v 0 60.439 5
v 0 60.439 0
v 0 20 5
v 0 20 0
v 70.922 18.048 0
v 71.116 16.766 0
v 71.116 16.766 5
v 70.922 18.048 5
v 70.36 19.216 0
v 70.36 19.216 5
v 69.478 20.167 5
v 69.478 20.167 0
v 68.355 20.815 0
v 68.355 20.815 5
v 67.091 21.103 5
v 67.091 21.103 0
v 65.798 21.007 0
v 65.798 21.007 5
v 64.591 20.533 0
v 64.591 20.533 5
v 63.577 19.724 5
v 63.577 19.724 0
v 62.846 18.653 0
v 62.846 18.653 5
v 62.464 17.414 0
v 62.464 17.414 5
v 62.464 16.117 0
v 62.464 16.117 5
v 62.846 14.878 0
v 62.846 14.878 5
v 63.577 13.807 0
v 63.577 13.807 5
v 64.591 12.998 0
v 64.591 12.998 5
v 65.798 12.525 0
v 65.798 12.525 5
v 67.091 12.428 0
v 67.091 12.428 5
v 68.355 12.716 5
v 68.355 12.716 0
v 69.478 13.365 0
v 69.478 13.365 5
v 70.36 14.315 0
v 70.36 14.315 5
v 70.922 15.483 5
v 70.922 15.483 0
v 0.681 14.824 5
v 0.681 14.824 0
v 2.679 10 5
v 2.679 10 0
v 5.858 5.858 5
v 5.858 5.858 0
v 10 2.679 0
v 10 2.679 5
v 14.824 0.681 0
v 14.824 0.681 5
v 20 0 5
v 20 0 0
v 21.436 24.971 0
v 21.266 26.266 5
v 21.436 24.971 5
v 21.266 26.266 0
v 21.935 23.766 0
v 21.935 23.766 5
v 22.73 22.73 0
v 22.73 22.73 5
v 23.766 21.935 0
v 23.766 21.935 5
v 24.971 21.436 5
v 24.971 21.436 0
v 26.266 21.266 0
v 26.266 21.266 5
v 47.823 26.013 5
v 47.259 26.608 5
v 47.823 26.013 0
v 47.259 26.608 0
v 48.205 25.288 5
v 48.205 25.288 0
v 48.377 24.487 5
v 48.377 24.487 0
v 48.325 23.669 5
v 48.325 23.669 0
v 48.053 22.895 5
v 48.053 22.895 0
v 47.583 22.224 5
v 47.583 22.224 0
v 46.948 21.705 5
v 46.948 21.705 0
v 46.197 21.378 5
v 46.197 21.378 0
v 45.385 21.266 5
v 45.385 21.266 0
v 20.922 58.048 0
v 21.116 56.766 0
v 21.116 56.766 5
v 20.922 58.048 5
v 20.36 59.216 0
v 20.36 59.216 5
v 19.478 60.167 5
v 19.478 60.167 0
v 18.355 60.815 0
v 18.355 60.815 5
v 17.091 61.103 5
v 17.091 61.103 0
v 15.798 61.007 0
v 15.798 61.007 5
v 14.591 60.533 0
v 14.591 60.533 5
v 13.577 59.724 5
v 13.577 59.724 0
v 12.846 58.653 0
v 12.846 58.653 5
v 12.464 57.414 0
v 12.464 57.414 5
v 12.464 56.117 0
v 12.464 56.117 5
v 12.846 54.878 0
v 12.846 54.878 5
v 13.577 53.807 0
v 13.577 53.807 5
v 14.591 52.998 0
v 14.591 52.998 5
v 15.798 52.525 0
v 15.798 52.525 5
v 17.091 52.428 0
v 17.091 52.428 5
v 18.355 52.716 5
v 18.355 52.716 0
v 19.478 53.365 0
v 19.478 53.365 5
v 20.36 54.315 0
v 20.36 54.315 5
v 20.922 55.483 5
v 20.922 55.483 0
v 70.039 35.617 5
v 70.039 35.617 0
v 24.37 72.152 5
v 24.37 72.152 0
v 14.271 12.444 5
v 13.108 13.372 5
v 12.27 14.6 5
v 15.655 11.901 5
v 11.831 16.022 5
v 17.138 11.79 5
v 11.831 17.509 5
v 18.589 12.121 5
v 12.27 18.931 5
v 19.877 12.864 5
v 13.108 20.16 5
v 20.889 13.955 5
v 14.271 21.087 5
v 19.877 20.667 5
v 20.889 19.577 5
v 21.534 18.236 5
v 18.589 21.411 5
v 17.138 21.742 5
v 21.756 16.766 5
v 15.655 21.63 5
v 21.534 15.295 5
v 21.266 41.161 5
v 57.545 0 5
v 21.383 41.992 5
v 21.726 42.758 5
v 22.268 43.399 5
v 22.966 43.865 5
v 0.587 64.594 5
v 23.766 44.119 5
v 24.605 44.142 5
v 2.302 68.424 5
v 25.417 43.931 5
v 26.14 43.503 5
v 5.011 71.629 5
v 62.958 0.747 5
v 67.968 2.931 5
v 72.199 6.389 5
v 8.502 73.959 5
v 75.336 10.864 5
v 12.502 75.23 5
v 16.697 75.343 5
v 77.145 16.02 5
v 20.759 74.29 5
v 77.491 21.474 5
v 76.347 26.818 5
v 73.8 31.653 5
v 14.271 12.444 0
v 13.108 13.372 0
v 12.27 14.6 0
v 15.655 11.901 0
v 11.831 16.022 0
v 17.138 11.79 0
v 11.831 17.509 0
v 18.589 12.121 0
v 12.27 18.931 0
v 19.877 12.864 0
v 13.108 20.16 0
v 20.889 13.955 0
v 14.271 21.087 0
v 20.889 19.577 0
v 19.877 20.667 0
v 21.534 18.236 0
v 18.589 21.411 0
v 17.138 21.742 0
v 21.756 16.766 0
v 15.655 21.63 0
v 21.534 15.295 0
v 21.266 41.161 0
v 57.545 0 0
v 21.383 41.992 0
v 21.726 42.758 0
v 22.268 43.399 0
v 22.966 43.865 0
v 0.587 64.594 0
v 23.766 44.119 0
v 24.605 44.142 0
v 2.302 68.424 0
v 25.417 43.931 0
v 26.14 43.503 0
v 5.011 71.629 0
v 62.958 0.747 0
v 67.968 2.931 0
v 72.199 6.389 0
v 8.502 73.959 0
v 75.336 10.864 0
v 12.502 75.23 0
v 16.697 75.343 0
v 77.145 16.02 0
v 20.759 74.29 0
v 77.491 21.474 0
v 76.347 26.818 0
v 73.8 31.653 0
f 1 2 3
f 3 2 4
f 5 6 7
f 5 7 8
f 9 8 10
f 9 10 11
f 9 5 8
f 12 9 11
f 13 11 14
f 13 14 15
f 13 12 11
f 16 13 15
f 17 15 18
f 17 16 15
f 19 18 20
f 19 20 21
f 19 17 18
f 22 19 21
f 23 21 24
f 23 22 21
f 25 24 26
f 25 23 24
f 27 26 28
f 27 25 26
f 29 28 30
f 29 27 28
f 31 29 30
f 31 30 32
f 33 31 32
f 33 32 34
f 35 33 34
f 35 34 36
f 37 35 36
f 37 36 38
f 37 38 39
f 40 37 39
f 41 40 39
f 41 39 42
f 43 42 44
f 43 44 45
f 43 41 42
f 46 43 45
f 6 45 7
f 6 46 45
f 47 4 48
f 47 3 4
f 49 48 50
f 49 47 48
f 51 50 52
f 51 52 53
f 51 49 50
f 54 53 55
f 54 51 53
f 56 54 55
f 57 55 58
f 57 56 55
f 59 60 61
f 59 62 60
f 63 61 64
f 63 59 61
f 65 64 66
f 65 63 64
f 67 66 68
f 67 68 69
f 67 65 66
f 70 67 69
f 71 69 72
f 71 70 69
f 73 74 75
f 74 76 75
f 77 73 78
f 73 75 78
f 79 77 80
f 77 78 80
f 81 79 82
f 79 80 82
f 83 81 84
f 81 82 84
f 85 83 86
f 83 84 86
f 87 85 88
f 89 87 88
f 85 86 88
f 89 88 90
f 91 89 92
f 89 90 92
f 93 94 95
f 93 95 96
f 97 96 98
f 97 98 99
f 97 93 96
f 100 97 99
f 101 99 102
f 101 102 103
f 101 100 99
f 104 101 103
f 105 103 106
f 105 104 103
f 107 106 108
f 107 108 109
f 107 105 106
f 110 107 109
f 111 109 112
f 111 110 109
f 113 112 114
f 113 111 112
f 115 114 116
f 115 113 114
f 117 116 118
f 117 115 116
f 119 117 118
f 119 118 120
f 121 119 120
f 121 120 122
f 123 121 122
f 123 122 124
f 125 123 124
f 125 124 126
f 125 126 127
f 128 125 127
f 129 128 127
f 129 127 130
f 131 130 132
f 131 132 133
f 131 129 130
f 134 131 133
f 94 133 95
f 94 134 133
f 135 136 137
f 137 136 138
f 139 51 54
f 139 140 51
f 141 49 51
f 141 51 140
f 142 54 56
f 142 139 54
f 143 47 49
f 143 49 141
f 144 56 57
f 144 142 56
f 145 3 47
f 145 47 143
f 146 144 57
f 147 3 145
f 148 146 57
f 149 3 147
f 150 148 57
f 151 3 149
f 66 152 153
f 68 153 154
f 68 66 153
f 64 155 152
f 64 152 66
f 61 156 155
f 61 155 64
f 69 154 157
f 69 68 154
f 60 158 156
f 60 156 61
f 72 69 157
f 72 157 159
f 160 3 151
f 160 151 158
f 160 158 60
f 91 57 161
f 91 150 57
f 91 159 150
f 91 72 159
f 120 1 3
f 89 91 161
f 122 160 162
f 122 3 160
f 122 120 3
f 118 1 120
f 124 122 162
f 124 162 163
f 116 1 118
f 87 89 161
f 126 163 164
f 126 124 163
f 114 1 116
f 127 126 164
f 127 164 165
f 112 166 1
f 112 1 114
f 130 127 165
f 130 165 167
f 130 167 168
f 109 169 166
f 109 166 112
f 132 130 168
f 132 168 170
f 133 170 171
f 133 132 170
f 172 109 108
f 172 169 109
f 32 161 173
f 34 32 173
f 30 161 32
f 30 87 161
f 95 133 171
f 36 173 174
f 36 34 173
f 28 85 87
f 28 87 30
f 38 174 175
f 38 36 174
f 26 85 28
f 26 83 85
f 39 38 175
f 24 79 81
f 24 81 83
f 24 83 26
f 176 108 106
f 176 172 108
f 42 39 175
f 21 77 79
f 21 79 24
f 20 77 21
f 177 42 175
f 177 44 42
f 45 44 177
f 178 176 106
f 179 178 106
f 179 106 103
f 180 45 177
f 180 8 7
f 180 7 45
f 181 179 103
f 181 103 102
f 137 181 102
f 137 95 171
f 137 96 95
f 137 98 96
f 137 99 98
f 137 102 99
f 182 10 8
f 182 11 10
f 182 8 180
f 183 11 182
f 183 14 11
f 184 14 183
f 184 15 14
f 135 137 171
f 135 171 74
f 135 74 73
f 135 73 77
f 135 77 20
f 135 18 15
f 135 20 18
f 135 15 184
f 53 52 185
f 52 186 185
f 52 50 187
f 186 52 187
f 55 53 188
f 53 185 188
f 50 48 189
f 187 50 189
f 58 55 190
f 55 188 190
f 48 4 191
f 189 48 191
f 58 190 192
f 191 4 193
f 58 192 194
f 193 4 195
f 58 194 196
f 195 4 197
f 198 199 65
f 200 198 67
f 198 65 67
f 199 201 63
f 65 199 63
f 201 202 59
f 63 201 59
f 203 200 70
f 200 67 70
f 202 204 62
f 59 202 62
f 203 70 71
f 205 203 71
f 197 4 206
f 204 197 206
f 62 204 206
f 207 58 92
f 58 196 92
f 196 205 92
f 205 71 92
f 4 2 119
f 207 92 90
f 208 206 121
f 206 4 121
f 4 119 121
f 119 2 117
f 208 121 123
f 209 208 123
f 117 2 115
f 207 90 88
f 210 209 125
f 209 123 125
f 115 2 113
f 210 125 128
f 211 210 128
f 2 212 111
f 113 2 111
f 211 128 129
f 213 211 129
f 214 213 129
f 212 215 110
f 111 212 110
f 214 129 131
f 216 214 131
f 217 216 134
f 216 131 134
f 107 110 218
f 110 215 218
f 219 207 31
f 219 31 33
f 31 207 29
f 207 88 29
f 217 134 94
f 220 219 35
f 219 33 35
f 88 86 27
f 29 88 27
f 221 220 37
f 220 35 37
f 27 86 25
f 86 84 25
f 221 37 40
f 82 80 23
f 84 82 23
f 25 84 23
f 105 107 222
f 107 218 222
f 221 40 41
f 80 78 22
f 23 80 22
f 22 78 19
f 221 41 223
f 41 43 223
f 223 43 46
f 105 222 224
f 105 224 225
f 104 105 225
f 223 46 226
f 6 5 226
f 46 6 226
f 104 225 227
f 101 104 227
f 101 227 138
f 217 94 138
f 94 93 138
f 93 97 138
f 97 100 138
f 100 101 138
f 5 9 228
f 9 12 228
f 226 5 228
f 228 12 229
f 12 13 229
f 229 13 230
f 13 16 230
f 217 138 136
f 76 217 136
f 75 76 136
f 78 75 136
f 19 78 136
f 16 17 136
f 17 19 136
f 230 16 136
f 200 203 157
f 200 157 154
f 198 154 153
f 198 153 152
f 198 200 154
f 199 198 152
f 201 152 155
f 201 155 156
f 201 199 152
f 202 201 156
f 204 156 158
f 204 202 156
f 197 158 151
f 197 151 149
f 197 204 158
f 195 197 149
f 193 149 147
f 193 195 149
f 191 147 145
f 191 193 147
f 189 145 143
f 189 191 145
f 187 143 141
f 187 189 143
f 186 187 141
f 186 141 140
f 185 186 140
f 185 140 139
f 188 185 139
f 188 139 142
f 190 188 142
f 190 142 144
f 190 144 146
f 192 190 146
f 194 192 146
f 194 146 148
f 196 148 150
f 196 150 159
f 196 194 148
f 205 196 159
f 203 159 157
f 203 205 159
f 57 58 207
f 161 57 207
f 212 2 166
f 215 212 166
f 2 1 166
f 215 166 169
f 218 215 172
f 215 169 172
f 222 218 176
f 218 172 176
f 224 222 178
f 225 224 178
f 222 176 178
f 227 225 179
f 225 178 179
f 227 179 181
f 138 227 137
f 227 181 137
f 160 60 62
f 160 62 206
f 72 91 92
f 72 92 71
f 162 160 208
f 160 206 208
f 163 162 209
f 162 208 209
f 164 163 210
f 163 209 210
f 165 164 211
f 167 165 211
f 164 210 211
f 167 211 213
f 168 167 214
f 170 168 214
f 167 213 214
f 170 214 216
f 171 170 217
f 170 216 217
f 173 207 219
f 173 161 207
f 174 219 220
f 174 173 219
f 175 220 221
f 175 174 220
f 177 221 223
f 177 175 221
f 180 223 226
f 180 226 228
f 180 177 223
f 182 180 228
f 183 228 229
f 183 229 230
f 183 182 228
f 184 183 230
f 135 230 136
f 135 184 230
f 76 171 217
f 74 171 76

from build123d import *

# Parameters (mm, degrees)
SKETCH1_R           = 4.35
SKETCH1_R_2         = 4.99
BOSS_EXTRUDE1_DEPTH = 5
FILLET1_R           = 15
FILLET2_R           = 20
FILLET3_R           = 20
CUT_EXTRUDE1_DEPTH  = 109.301776601
FILLET4_R           = 5
FILLET5_R           = 3
FILLET6_R           = 3


with BuildPart() as part:
    # Sketch1 → Boss-Extrude1 (new body)
    with BuildSketch(Plane.XY):
        Polygon((0, 91.64845728), (0, 0), (114.5605716, 0), align=None)
        with Locations((16.765578361, 56.765578361)):
            Circle(SKETCH1_R, mode=Mode.SUBTRACT)
        with Locations((66.765578361, 16.765578361)):
            Circle(SKETCH1_R, mode=Mode.SUBTRACT)
        with Locations((16.765578361, 16.765578361)):
            Circle(SKETCH1_R_2, mode=Mode.SUBTRACT)
    extrude(amount=BOSS_EXTRUDE1_DEPTH)

    # Fillet1
    fillet1_edges = [part.edges().sort_by_distance(p)[0] for p in [
        (0, 91.64845728, 2.5),
    ]]
    fillet(fillet1_edges, radius=FILLET1_R)

    # Fillet2
    fillet2_edges = [part.edges().sort_by_distance(p)[0] for p in [
        (0, 0, 2.5),
    ]]
    fillet(fillet2_edges, radius=FILLET2_R)

    # Fillet3
    fillet3_edges = [part.edges().sort_by_distance(p)[0] for p in [
        (114.5605716, 0, 2.5),
    ]]
    fillet(fillet3_edges, radius=FILLET3_R)

    # Sketch2 → Cut-Extrude1 (cut, through all)
    with BuildSketch(Plane.XY.offset(5)):
        Polygon((21.265578361, 47.402766547), (53.937063594, 21.265578361), (21.265578361, 21.265578361), align=None)
    extrude(amount=-CUT_EXTRUDE1_DEPTH, mode=Mode.SUBTRACT)

    # Fillet4
    fillet4_edges = [part.edges().sort_by_distance(p)[0] for p in [
        (21.265578361, 21.265578361, 2.5),
    ]]
    fillet(fillet4_edges, radius=FILLET4_R)

    # Fillet5
    fillet5_edges = [part.edges().sort_by_distance(p)[0] for p in [
        (21.265578361, 47.402766547, 2.5),
    ]]
    fillet(fillet5_edges, radius=FILLET5_R)

    # Fillet6
    fillet6_edges = [part.edges().sort_by_distance(p)[0] for p in [
        (53.937063594, 21.265578361, 2.5),
    ]]
    fillet(fillet6_edges, radius=FILLET6_R)


solid = part.part
